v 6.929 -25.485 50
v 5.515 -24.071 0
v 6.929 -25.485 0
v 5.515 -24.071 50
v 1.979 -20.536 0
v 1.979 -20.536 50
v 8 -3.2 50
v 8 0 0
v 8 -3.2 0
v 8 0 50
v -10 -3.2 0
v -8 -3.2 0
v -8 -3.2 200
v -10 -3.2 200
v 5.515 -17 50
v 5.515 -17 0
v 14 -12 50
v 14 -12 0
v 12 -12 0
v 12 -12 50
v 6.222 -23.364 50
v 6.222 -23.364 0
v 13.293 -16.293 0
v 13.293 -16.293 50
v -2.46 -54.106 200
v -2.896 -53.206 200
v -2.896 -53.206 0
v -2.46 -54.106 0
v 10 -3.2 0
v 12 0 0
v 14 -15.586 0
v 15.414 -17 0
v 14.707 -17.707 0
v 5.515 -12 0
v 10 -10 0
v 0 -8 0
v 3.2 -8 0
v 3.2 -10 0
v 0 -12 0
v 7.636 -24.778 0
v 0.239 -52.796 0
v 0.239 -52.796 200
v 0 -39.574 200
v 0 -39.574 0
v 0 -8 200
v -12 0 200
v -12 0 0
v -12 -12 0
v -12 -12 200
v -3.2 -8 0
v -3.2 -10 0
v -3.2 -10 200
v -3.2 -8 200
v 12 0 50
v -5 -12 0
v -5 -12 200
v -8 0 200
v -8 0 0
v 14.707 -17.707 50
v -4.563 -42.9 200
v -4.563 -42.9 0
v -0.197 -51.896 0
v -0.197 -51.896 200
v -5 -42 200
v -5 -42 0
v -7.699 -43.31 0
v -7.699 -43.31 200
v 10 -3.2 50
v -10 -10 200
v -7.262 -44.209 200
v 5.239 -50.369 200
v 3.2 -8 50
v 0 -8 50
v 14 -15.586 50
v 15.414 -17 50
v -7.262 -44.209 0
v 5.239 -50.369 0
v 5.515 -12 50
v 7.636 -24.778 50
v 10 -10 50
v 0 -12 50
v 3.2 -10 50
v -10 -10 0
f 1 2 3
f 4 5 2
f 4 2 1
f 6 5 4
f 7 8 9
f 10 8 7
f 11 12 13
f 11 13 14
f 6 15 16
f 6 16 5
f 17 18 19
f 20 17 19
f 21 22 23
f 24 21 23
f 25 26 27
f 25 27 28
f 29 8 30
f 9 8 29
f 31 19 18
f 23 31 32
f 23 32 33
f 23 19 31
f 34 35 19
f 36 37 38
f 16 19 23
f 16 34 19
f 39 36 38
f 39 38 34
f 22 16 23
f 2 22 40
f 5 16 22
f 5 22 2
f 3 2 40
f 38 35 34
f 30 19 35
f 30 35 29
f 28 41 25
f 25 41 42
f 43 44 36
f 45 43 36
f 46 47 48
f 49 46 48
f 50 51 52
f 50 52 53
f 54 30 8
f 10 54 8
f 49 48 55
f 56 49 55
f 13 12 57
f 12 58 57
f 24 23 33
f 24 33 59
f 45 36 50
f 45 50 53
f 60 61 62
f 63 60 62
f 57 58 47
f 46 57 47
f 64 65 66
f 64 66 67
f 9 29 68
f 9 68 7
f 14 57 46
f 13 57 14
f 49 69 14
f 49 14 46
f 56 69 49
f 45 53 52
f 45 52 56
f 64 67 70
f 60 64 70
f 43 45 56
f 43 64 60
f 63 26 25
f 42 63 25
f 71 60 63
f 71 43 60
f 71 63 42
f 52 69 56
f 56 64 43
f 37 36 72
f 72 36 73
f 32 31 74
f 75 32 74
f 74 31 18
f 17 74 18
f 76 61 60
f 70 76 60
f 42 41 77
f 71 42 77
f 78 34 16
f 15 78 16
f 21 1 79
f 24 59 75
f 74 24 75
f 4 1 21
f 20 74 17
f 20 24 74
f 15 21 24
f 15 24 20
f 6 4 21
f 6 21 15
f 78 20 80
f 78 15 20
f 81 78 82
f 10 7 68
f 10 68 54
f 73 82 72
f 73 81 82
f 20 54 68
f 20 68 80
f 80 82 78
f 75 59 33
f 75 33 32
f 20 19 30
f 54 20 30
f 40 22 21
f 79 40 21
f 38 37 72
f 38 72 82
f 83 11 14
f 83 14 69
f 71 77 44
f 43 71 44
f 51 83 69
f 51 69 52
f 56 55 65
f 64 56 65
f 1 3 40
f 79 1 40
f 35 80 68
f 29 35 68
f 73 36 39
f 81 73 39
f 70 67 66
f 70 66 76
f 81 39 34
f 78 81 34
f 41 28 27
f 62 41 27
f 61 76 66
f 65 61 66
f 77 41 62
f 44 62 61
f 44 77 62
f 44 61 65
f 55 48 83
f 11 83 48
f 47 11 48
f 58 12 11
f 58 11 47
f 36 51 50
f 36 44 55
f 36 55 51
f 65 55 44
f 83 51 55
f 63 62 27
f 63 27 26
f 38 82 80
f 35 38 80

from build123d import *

# Parameters (mm, degrees)
F2_DEPTH  = 200
F3_DEPTH  = 200.001
F4_W      = 1
F4_H      = 200
F5_DEPTH  = 3
F7_DEPTH  = 50
F8_DEPTH  = 200.001
F9_W      = 1
F9_H      = 50
F10_DEPTH = 2
F11_DEPTH = 0.2
F12_DEPTH = 0.2
F13_DEPTH = 0.2


with BuildPart() as f2:
    # F1 (on Top) → F2 (new body)
    with BuildSketch(Plane.XY):
        Polygon((0, -39.5735367915), (0, 0), (-12, 0), (-12, -12), (-5, -12), (-5, -42), (0.2391641397, -52.7958862127), (5.2391641397, -50.3694230041), align=None)
    extrude(amount=F2_DEPTH)

    # F0 (on Top) → F3 (cut, through all)
    with BuildSketch(Plane.XY):
        Polygon((-10, 10), (-10, 3), (-8, 3), (-8, -3), (-10, -3), (-10, -10), (-3, -10), (-3, -8), (3, -8), (3, -10), (10, -10), (10, -3), (8, -3), (8, 3), (10, 3), (10, 10), (3, 10), (3, 8), (-3, 8), (-3, 10), align=None)
    extrude(amount=F3_DEPTH, mode=Mode.SUBTRACT)

    # F4 (on face) → F5 (join)
    with BuildSketch(Plane(origin=(-20.5439960519, -9.9698501152, 0), x_dir=(0.4365970116, -0.8996571844, 0), z_dir=(-0.8996571844, -0.4365970116, 0))):
        with Locations((36.1026166861, 100)):
            Rectangle(F4_W, F4_H)
        with Locations((47.1026166861, 100)):
            Rectangle(F4_W, F4_H)
    extrude(amount=F5_DEPTH)

    # F11 (add): a face of the model
    f11_faces = [f2.faces().sort_by_distance(p)[0] for p in [
        (-9, -3, 100),
    ]]
    extrude(f11_faces, amount=F11_DEPTH)

    # F13 (add): a face of the model
    f13_faces = [f2.faces().sort_by_distance(p)[0] for p in [
        (-3, -9, 100),
    ]]
    extrude(f13_faces, amount=F13_DEPTH)


with BuildPart() as f7:
    # F6 (on Top) → F7 (new body)
    with BuildSketch(Plane.XY):
        Polygon((12, 0), (0, 0), (0, -12), (5.5147186258, -12), (5.5147186258, -17), (1.9791847198, -20.5355339059), (5.5147186258, -24.0710678119), (14, -15.5857864376), (14, -12), (12, -12), align=None)
    extrude(amount=F7_DEPTH)

    # F0 (on Top) → F8 (cut, through all)
    with BuildSketch(Plane.XY):
        Polygon((-10, 10), (-10, 3), (-8, 3), (-8, -3), (-10, -3), (-10, -10), (-3, -10), (-3, -8), (3, -8), (3, -10), (10, -10), (10, -3), (8, -3), (8, 3), (10, 3), (10, 10), (3, 10), (3, 8), (-3, 8), (-3, 10), align=None)
    extrude(amount=F8_DEPTH, mode=Mode.SUBTRACT)

    # F9 (on face) → F10 (join)
    with BuildSketch(Plane(origin=(14.7928932188, -14.7928932188, 0), x_dir=(0.7071067812, 0.7071067812, 0), z_dir=(0.7071067812, -0.7071067812, 0))):
        with Locations((-12.6213203436, 25)):
            Rectangle(F9_W, F9_H)
        with Locations((-1.6213203436, 25)):
            Rectangle(F9_W, F9_H)
    extrude(amount=F10_DEPTH)

    # F11#2 (add): a face of the model
    f11_2_faces = [f7.faces().sort_by_distance(p)[0] for p in [
        (9, -3, 25),
    ]]
    extrude(f11_2_faces, amount=F11_DEPTH)

    # F12 (add): a face of the model
    f12_faces = [f7.faces().sort_by_distance(p)[0] for p in [
        (3, -9, 25),
    ]]
    extrude(f12_faces, amount=F12_DEPTH)


solid = Compound([f2.part, f7.part])
